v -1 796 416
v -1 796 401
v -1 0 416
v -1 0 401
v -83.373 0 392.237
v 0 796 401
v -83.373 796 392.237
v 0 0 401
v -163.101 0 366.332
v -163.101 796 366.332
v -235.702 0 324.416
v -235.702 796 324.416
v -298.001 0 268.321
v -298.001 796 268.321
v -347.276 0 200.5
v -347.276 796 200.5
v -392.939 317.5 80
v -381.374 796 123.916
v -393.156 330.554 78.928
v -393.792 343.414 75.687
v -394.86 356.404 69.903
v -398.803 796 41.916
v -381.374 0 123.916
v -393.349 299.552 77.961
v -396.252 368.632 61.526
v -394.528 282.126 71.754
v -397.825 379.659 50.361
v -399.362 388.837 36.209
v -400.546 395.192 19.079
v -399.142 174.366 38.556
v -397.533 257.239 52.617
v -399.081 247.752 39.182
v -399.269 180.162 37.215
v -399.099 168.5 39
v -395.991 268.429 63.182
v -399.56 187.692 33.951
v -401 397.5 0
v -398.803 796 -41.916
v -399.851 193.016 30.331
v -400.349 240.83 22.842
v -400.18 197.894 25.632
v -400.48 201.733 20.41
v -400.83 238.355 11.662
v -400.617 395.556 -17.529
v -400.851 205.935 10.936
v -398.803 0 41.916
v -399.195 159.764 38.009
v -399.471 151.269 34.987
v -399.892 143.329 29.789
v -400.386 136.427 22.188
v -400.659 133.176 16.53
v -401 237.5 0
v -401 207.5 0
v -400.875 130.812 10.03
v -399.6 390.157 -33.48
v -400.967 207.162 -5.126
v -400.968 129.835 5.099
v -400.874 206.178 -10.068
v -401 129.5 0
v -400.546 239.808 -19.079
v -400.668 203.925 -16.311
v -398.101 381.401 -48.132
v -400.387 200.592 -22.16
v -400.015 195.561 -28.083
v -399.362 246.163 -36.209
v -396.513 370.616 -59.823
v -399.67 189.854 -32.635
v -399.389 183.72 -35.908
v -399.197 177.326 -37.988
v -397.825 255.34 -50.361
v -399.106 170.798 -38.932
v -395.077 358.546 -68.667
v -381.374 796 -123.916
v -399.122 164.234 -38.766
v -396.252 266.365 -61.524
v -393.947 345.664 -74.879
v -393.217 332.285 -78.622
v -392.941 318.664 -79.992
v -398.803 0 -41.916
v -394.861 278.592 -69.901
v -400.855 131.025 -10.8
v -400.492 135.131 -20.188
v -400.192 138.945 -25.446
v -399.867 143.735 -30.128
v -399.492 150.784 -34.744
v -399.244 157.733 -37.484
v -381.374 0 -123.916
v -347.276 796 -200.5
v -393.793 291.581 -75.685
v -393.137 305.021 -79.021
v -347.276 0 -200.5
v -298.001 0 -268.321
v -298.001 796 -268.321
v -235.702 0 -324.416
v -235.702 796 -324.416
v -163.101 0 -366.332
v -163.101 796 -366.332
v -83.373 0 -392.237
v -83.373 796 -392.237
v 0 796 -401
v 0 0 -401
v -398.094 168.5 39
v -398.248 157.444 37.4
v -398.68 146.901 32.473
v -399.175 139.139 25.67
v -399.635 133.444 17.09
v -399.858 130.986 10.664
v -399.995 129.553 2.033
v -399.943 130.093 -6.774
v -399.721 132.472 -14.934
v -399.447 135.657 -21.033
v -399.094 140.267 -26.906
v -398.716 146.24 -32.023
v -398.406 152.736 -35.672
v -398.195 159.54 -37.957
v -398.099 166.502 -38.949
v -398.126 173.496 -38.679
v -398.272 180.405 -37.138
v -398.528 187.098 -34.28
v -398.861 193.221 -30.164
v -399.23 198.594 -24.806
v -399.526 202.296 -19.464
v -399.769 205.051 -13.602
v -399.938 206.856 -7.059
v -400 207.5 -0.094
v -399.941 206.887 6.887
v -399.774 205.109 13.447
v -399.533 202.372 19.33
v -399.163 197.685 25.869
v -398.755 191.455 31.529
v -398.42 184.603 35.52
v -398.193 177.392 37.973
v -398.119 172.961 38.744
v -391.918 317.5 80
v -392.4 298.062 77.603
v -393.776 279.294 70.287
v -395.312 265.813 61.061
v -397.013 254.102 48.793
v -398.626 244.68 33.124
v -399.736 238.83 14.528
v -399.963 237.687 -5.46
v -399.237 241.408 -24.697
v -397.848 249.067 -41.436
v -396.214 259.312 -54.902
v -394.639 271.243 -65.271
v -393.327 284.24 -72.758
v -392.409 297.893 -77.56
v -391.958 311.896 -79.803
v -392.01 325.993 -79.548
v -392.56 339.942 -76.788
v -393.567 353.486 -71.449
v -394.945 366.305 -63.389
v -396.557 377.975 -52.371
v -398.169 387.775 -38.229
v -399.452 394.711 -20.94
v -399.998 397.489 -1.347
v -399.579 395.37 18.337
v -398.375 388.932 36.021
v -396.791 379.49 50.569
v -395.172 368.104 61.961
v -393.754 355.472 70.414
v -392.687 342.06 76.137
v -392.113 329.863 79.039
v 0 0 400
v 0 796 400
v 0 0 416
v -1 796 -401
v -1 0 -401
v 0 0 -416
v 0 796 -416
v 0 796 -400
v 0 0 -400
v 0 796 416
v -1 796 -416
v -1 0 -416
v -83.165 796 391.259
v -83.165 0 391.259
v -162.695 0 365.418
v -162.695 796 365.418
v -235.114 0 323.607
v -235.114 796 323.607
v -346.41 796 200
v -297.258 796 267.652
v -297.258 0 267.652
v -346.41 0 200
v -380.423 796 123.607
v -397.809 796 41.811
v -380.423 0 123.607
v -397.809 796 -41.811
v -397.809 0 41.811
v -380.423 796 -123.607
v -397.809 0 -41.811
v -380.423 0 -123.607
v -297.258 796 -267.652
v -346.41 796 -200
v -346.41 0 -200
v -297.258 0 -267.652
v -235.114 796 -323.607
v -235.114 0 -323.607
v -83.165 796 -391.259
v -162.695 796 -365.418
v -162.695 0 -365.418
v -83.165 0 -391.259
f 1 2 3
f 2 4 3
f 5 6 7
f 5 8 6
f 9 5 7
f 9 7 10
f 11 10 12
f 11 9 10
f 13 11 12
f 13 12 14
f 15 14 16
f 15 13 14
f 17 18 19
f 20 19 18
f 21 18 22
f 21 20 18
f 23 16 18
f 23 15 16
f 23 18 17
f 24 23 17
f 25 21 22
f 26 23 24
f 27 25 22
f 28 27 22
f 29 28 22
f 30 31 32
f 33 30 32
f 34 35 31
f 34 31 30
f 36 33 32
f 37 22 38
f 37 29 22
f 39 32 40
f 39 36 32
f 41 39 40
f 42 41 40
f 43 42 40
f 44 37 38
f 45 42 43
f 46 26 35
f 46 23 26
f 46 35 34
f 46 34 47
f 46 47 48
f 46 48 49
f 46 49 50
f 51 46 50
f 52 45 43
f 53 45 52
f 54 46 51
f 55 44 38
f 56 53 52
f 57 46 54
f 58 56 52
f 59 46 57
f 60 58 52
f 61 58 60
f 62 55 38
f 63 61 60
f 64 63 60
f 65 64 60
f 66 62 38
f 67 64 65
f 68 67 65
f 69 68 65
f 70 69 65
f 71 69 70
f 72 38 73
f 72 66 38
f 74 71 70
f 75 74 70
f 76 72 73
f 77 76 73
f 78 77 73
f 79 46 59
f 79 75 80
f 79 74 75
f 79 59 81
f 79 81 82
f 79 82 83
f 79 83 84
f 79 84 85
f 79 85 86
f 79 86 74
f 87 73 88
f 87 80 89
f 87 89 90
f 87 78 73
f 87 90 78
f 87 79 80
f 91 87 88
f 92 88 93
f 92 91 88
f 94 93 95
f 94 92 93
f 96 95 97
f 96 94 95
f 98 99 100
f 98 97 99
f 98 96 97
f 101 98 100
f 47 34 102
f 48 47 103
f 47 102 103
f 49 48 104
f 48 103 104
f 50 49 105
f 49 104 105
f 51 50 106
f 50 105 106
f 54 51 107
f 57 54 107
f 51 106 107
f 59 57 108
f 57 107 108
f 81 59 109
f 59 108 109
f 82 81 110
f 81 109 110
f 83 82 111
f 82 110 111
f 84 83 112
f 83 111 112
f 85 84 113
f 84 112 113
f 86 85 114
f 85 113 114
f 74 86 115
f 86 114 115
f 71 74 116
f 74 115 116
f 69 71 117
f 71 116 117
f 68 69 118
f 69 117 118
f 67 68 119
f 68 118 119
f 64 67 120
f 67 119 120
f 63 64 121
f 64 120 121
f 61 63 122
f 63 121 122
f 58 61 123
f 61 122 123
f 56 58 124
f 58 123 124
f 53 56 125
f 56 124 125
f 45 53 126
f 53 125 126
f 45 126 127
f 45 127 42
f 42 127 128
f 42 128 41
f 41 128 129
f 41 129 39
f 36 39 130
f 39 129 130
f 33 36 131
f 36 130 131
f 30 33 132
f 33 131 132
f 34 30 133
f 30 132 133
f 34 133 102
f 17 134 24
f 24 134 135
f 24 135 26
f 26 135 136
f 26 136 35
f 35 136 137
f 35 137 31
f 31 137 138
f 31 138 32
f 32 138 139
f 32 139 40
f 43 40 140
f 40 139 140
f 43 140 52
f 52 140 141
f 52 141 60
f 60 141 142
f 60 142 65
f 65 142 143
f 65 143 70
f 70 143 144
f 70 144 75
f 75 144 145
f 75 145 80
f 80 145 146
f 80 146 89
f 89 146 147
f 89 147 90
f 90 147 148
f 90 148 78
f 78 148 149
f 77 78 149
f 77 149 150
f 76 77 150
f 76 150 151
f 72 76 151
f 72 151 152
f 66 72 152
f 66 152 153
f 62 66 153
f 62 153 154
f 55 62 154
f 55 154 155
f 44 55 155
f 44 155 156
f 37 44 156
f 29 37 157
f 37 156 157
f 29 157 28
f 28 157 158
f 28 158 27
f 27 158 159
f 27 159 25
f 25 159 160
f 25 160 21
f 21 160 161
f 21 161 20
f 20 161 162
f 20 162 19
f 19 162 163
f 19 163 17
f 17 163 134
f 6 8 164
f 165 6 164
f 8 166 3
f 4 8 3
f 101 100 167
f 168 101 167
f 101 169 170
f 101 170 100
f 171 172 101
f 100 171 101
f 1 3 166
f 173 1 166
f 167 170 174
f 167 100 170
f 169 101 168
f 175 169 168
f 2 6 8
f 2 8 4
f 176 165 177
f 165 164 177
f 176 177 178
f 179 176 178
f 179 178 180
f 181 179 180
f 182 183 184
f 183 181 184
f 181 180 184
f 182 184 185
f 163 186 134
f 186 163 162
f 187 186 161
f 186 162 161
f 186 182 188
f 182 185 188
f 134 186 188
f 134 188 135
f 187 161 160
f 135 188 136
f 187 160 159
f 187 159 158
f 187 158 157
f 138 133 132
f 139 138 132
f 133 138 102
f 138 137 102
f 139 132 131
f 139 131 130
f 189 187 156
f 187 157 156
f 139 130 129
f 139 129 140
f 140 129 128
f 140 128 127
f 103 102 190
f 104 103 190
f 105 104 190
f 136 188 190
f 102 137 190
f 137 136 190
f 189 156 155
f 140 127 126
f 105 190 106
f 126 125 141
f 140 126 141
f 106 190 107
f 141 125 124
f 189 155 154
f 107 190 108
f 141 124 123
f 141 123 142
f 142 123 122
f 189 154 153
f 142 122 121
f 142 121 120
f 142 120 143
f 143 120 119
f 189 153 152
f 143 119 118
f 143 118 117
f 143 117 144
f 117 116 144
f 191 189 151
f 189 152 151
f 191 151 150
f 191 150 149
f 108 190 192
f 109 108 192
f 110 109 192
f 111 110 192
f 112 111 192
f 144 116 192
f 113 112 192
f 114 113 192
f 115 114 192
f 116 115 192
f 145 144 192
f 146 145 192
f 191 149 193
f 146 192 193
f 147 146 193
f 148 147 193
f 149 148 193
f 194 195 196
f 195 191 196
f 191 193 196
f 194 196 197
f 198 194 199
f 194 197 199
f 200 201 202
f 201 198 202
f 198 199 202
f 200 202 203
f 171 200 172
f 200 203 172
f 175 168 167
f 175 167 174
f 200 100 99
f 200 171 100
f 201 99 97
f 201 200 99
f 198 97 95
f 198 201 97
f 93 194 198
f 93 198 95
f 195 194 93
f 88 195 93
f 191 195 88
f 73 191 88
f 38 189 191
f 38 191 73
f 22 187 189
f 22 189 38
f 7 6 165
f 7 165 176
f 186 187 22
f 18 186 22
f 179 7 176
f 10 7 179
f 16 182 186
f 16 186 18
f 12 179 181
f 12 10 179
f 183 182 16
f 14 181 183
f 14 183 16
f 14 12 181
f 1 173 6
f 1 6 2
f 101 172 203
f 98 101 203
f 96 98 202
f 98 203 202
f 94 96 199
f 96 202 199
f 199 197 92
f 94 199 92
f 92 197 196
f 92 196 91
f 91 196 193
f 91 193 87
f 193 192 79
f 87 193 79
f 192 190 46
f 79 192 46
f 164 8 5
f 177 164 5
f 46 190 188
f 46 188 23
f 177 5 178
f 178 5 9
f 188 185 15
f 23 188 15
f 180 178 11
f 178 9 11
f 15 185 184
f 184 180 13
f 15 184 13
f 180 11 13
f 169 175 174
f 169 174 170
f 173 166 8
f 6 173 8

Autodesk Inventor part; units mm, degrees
ref_plane "YZ Plane" through (0, 0, 0) normal (1, 0, 0) x (0, 1, 0)
ref_plane "XZ Plane" through (0, 0, 0) normal (0, 1, 0) x (-1, 0, 0)
sketch "Sketch1" plane through (0, 0, 0) normal (0, 1, 0) x (-1, 0, 0)
  arc A0 (0, -401) -> (0, 401) centre (0, 0) ccw
  line L0 (0, 0) -> (0, 401) construction
  line L1 (0, 0) -> (401, 0) construction
  line L2 (0, 0) -> (0, -401) construction
  arc A1 (0, -400) -> (0, 400) centre (0, 0) ccw
  line L3 (0, 0) -> (0, 400) construction
  line L4 (0, 0) -> (0, -400) construction
  line L5 (0, 401) -> (0, 400)
  line L6 (0, -400) -> (0, -401)
  dimension "d0" = 401
  dimension "d1" = 90
  dimension "d2" = 180
  dimension "d3" = 400
  dimension "d4" = 180
extrude "Extrusion1" add sketch "Sketch1" along normal blind 796
sketch "Sketch2" plane through (0, 0, 0) normal (0, 1, 0) x (-1, 0, 0)
  line L0 (0, -401) -> (1, -401)
  line L1 (1, -401) -> (1, -416)
  line L2 (1, -416) -> (0, -416)
  line L3 (0, -416) -> (0, -401)
  point P0 (0, 0)
  dimension "d7" = 1
  dimension "d8" = 15
extrude "Extrusion2" add sketch "Sketch2" along normal blind 796
sketch "Sketch3" plane through (0, 0, 0) normal (0, 1, 0) x (-1, 0, 0)
  line L0 (0, 401) -> (1, 401)
  line L1 (1, 401) -> (1, 416)
  line L2 (1, 416) -> (0, 416)
  line L3 (0, 416) -> (0, 401)
  point P0 (0, 0)
  dimension "d11" = 1
  dimension "d12" = 15
extrude "Extrusion3" add sketch "Sketch3" along normal blind 796
sketch "Sketch4" plane through (0, 0, 0) normal (0, 1, 0) x (-1, 0, 0)
  line L0 (0, 0) -> (401, 0)
  dimension "d15" = 401
ref_plane "Work Plane1" through (-401, 0, 0) normal (-1, 0, 0) x (0, -1, 0)
sketch "Sketch5" plane through (-401, 0, 0) normal (-1, 0, 0) x (0, -1, 0)
  circle A0 centre (-168.5, 0) radius 39
  line L0 (-796, 401) -> (-796, -401) projected
  point P0 (0, 0)
  dimension "d16" = 78
  dimension "d17" = 627.5
hole "Hole1" at (-401, 168.5, 0) direction (1, 0, 0) diameter 78 end through all
sketch "Sketch6" plane through (-401, 0, 0) normal (-1, 0, 0) x (0, -1, 0)
  circle A0 centre (-317.5, 0) radius 80
  line L0 (-796, 401) -> (-796, -401) projected
  point P0 (0, 0)
  dimension "d25" = 160
  dimension "d26" = 478.5
hole "Hole2" at (-401, 317.5, 0) direction (1, 0, 0) diameter 160 end through all
properties part number "Upper Front Half"
